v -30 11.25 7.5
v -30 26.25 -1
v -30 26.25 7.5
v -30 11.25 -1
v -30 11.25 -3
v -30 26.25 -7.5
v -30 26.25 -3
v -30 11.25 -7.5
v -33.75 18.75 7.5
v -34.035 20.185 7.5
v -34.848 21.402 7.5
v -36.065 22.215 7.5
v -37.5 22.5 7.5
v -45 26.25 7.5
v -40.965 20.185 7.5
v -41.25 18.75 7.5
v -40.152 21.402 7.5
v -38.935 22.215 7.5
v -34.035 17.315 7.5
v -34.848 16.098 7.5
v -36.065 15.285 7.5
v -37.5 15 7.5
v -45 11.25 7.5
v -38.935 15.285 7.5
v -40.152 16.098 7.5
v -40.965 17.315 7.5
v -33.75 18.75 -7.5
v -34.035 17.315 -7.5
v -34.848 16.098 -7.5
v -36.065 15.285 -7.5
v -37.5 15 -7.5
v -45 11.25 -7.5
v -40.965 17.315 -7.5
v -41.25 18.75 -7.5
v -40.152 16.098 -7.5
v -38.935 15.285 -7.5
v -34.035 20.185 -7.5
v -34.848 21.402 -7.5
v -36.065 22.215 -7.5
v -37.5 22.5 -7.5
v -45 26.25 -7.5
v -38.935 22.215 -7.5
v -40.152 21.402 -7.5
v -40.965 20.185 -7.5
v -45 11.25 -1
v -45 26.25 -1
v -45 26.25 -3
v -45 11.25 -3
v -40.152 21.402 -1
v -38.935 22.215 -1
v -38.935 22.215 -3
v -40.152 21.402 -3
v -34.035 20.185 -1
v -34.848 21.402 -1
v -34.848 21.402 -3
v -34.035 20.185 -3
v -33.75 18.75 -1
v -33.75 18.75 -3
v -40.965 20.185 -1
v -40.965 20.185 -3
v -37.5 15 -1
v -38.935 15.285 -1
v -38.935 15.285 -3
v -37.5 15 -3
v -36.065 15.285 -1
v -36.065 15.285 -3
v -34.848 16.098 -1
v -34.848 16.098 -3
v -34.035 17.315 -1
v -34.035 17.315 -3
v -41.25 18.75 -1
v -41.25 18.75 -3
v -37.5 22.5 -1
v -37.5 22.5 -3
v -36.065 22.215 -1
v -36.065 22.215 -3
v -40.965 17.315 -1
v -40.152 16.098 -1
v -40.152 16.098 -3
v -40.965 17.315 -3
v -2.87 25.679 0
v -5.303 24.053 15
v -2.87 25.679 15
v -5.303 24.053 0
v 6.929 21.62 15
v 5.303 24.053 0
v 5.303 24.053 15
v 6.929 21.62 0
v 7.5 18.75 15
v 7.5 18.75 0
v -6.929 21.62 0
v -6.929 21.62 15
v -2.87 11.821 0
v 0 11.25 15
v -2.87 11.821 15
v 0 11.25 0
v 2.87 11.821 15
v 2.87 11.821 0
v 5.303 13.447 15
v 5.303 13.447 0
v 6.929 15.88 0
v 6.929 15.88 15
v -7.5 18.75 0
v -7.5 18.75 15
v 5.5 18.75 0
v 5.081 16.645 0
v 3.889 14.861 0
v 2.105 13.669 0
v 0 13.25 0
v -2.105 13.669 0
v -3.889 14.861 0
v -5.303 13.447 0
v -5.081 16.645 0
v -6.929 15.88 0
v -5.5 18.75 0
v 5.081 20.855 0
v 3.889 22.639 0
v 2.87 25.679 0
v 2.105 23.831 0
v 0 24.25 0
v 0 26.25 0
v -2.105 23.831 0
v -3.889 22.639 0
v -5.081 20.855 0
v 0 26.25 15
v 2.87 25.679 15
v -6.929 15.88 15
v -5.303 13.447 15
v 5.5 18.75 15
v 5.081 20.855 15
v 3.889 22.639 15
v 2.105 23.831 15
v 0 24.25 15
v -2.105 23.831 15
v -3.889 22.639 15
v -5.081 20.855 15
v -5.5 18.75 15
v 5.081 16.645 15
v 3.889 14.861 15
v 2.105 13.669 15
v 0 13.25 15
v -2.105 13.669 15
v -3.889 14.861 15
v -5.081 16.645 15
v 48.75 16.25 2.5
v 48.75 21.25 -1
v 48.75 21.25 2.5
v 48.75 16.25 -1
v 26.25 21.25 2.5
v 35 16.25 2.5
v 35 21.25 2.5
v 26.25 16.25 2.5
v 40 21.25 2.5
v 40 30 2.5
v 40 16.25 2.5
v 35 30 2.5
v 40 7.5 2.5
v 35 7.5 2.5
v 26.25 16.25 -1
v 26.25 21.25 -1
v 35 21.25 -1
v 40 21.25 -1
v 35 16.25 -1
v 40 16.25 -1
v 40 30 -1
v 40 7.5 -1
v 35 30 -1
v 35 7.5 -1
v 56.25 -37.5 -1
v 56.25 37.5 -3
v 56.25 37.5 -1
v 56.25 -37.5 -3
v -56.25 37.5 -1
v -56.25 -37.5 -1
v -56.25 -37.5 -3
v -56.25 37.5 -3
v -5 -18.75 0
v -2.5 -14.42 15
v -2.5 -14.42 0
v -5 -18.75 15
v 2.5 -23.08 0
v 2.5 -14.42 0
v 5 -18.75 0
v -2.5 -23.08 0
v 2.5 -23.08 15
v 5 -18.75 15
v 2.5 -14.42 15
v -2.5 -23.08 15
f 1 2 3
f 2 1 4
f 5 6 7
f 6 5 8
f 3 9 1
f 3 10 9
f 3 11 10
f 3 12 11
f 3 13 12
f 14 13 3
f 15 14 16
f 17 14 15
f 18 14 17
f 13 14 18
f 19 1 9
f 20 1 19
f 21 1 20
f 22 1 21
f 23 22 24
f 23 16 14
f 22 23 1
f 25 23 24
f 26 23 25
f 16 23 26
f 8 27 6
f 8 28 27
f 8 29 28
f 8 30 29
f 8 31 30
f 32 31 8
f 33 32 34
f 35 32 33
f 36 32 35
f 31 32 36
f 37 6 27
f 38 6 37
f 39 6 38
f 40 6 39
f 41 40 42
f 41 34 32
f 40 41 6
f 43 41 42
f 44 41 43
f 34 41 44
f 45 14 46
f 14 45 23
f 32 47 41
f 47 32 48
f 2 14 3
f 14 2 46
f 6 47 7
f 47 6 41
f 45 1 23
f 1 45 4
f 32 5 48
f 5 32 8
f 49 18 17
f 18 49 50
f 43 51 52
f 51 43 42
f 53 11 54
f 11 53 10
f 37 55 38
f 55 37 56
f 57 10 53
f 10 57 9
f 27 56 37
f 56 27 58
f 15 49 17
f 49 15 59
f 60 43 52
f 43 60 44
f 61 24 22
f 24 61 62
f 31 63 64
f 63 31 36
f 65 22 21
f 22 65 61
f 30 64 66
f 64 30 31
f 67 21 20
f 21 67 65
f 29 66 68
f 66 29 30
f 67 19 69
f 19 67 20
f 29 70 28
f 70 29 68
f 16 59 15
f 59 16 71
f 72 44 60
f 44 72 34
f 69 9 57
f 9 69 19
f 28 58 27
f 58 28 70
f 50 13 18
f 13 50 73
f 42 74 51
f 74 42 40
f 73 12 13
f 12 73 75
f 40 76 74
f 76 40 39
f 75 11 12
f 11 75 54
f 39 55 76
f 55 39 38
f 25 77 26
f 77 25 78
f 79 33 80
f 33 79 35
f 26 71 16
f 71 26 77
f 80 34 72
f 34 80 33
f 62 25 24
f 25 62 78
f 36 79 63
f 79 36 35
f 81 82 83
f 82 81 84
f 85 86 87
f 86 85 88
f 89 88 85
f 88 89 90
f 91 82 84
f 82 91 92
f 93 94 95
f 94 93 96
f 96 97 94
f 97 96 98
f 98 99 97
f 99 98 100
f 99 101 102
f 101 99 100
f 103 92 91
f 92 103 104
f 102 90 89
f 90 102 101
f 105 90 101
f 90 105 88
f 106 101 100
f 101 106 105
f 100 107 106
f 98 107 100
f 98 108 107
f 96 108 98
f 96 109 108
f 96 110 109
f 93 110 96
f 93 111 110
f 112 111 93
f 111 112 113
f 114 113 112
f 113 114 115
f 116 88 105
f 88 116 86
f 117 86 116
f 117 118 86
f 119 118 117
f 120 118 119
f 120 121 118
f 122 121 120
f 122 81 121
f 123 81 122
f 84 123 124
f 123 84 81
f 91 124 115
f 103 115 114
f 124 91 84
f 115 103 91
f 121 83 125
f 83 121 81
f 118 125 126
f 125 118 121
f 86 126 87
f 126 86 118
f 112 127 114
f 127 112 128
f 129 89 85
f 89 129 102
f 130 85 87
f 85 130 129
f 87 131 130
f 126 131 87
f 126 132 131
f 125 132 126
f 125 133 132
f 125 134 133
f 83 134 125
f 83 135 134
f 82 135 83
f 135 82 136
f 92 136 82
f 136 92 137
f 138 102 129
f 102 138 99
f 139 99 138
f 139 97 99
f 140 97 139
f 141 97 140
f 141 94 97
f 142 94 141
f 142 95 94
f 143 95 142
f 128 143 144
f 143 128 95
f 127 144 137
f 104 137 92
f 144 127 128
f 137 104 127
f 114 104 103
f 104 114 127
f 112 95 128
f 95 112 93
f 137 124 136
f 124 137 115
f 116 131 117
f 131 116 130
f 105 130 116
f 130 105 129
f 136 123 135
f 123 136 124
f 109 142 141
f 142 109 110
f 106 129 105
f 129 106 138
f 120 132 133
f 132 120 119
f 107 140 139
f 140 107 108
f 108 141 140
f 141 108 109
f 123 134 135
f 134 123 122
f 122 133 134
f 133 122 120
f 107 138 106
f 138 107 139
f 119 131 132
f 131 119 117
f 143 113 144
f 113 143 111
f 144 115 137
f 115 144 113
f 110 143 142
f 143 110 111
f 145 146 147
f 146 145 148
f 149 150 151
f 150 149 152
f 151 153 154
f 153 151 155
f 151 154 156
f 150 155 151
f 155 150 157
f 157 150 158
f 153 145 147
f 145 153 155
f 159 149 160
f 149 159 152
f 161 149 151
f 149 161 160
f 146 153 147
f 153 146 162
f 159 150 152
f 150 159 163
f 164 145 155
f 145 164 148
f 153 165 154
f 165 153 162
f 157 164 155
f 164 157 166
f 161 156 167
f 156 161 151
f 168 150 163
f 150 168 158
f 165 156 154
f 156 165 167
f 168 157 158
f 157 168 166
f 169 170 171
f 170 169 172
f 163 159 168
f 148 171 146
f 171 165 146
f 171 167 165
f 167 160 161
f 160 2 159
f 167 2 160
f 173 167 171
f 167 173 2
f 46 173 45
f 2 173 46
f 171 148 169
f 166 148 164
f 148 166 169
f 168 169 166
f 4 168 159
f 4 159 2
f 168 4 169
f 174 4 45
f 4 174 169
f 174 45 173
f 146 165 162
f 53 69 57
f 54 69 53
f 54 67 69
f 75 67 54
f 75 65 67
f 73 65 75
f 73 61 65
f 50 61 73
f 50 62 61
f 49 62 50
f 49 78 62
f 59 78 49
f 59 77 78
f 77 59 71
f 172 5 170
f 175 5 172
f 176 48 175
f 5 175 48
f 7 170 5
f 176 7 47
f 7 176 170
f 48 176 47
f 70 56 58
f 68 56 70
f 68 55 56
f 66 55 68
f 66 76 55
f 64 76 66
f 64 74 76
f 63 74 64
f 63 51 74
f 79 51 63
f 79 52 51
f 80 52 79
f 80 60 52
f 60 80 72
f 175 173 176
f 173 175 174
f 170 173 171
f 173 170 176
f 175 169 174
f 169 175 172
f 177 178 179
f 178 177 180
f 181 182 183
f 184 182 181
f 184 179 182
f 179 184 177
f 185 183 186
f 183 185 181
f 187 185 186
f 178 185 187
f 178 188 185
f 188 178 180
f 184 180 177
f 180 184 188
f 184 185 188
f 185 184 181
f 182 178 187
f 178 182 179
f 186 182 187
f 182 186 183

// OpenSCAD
// file: helpers.scad
// Low-level helper functions and modules
// This file is `use`d by parts.scad, testing that transitive
// dependencies (nested includes/uses) resolve correctly.

// Clamp a value between min and max
function clamp(val, lo, hi) = max(lo, min(hi, val));

// Linear interpolation
function lerp(a, b, t) = a + (b - a) * clamp(t, 0, 1);

// Generate a regular polygon as a list of 2D points
function regular_polygon(sides, radius) = [
  for (i = [0:sides - 1])
    [radius * cos(i * 360 / sides), radius * sin(i * 360 / sides)]
];

// Extrude a regular polygon
module prism(sides, radius, height) {
  linear_extrude(height = height)
    polygon(regular_polygon(sides, radius));
}
// file: config.scad
// Shared configuration values
// This file is included via `include <config.scad>` so all
// variables are available directly in the including file.

// Part dimensions
part_size = 15;
wall_thickness = 2;

// Quality — keep low for fast rendering
$fn = 16;
// file: parts.scad
// Reusable part modules
// This file is loaded via `use <parts.scad>` so only modules
// and functions are available (not top-level variables).

use <helpers.scad>

// A simple box with a cylindrical hole
module box_with_hole(size, hole_r) {
  difference() {
    cube(size, center = true);
    cylinder(r = hole_r, h = size + 1, center = true);
  }
}

// A hollow cylinder (tube)
module hollow_cylinder(outer_r, h, wall) {
  difference() {
    cylinder(r = outer_r, h = h);
    translate([0, 0, -1])
      cylinder(r = outer_r - wall, h = h + 2);
  }
}

// A plus-shaped beam
module cross_beam(length, width, height) {
  union() {
    cube([length, width, height], center = true);
    cube([width, length, height], center = true);
  }
}

// A hexagonal prism (uses helpers.scad)
module hex_standoff(radius, height) {
  prism(6, radius, height);
}
// main file
// Multi-file workspace example
// Open this file in OpenSCAD Studio to test include/use support.
// All .scad files in this directory will be mounted automatically.

use <parts.scad>
include <config.scad>

// Layout all parts using shared config values
spacing = part_size * 2.5;

// Base plate
color("SlateGray")
  translate([0, 0, -2])
    cube([spacing * 3, spacing * 2, 2], center = true);

// Row 1
translate([-spacing, spacing / 2, 0])
  box_with_hole(part_size, part_size / 4);

translate([0, spacing / 2, 0])
  hollow_cylinder(part_size / 2, part_size, wall_thickness);

translate([spacing, spacing / 2, 0])
  cross_beam(part_size * 1.5, part_size / 3, part_size / 3);

// Row 2
translate([0, -spacing / 2, 0])
  hex_standoff(part_size / 3, part_size);
